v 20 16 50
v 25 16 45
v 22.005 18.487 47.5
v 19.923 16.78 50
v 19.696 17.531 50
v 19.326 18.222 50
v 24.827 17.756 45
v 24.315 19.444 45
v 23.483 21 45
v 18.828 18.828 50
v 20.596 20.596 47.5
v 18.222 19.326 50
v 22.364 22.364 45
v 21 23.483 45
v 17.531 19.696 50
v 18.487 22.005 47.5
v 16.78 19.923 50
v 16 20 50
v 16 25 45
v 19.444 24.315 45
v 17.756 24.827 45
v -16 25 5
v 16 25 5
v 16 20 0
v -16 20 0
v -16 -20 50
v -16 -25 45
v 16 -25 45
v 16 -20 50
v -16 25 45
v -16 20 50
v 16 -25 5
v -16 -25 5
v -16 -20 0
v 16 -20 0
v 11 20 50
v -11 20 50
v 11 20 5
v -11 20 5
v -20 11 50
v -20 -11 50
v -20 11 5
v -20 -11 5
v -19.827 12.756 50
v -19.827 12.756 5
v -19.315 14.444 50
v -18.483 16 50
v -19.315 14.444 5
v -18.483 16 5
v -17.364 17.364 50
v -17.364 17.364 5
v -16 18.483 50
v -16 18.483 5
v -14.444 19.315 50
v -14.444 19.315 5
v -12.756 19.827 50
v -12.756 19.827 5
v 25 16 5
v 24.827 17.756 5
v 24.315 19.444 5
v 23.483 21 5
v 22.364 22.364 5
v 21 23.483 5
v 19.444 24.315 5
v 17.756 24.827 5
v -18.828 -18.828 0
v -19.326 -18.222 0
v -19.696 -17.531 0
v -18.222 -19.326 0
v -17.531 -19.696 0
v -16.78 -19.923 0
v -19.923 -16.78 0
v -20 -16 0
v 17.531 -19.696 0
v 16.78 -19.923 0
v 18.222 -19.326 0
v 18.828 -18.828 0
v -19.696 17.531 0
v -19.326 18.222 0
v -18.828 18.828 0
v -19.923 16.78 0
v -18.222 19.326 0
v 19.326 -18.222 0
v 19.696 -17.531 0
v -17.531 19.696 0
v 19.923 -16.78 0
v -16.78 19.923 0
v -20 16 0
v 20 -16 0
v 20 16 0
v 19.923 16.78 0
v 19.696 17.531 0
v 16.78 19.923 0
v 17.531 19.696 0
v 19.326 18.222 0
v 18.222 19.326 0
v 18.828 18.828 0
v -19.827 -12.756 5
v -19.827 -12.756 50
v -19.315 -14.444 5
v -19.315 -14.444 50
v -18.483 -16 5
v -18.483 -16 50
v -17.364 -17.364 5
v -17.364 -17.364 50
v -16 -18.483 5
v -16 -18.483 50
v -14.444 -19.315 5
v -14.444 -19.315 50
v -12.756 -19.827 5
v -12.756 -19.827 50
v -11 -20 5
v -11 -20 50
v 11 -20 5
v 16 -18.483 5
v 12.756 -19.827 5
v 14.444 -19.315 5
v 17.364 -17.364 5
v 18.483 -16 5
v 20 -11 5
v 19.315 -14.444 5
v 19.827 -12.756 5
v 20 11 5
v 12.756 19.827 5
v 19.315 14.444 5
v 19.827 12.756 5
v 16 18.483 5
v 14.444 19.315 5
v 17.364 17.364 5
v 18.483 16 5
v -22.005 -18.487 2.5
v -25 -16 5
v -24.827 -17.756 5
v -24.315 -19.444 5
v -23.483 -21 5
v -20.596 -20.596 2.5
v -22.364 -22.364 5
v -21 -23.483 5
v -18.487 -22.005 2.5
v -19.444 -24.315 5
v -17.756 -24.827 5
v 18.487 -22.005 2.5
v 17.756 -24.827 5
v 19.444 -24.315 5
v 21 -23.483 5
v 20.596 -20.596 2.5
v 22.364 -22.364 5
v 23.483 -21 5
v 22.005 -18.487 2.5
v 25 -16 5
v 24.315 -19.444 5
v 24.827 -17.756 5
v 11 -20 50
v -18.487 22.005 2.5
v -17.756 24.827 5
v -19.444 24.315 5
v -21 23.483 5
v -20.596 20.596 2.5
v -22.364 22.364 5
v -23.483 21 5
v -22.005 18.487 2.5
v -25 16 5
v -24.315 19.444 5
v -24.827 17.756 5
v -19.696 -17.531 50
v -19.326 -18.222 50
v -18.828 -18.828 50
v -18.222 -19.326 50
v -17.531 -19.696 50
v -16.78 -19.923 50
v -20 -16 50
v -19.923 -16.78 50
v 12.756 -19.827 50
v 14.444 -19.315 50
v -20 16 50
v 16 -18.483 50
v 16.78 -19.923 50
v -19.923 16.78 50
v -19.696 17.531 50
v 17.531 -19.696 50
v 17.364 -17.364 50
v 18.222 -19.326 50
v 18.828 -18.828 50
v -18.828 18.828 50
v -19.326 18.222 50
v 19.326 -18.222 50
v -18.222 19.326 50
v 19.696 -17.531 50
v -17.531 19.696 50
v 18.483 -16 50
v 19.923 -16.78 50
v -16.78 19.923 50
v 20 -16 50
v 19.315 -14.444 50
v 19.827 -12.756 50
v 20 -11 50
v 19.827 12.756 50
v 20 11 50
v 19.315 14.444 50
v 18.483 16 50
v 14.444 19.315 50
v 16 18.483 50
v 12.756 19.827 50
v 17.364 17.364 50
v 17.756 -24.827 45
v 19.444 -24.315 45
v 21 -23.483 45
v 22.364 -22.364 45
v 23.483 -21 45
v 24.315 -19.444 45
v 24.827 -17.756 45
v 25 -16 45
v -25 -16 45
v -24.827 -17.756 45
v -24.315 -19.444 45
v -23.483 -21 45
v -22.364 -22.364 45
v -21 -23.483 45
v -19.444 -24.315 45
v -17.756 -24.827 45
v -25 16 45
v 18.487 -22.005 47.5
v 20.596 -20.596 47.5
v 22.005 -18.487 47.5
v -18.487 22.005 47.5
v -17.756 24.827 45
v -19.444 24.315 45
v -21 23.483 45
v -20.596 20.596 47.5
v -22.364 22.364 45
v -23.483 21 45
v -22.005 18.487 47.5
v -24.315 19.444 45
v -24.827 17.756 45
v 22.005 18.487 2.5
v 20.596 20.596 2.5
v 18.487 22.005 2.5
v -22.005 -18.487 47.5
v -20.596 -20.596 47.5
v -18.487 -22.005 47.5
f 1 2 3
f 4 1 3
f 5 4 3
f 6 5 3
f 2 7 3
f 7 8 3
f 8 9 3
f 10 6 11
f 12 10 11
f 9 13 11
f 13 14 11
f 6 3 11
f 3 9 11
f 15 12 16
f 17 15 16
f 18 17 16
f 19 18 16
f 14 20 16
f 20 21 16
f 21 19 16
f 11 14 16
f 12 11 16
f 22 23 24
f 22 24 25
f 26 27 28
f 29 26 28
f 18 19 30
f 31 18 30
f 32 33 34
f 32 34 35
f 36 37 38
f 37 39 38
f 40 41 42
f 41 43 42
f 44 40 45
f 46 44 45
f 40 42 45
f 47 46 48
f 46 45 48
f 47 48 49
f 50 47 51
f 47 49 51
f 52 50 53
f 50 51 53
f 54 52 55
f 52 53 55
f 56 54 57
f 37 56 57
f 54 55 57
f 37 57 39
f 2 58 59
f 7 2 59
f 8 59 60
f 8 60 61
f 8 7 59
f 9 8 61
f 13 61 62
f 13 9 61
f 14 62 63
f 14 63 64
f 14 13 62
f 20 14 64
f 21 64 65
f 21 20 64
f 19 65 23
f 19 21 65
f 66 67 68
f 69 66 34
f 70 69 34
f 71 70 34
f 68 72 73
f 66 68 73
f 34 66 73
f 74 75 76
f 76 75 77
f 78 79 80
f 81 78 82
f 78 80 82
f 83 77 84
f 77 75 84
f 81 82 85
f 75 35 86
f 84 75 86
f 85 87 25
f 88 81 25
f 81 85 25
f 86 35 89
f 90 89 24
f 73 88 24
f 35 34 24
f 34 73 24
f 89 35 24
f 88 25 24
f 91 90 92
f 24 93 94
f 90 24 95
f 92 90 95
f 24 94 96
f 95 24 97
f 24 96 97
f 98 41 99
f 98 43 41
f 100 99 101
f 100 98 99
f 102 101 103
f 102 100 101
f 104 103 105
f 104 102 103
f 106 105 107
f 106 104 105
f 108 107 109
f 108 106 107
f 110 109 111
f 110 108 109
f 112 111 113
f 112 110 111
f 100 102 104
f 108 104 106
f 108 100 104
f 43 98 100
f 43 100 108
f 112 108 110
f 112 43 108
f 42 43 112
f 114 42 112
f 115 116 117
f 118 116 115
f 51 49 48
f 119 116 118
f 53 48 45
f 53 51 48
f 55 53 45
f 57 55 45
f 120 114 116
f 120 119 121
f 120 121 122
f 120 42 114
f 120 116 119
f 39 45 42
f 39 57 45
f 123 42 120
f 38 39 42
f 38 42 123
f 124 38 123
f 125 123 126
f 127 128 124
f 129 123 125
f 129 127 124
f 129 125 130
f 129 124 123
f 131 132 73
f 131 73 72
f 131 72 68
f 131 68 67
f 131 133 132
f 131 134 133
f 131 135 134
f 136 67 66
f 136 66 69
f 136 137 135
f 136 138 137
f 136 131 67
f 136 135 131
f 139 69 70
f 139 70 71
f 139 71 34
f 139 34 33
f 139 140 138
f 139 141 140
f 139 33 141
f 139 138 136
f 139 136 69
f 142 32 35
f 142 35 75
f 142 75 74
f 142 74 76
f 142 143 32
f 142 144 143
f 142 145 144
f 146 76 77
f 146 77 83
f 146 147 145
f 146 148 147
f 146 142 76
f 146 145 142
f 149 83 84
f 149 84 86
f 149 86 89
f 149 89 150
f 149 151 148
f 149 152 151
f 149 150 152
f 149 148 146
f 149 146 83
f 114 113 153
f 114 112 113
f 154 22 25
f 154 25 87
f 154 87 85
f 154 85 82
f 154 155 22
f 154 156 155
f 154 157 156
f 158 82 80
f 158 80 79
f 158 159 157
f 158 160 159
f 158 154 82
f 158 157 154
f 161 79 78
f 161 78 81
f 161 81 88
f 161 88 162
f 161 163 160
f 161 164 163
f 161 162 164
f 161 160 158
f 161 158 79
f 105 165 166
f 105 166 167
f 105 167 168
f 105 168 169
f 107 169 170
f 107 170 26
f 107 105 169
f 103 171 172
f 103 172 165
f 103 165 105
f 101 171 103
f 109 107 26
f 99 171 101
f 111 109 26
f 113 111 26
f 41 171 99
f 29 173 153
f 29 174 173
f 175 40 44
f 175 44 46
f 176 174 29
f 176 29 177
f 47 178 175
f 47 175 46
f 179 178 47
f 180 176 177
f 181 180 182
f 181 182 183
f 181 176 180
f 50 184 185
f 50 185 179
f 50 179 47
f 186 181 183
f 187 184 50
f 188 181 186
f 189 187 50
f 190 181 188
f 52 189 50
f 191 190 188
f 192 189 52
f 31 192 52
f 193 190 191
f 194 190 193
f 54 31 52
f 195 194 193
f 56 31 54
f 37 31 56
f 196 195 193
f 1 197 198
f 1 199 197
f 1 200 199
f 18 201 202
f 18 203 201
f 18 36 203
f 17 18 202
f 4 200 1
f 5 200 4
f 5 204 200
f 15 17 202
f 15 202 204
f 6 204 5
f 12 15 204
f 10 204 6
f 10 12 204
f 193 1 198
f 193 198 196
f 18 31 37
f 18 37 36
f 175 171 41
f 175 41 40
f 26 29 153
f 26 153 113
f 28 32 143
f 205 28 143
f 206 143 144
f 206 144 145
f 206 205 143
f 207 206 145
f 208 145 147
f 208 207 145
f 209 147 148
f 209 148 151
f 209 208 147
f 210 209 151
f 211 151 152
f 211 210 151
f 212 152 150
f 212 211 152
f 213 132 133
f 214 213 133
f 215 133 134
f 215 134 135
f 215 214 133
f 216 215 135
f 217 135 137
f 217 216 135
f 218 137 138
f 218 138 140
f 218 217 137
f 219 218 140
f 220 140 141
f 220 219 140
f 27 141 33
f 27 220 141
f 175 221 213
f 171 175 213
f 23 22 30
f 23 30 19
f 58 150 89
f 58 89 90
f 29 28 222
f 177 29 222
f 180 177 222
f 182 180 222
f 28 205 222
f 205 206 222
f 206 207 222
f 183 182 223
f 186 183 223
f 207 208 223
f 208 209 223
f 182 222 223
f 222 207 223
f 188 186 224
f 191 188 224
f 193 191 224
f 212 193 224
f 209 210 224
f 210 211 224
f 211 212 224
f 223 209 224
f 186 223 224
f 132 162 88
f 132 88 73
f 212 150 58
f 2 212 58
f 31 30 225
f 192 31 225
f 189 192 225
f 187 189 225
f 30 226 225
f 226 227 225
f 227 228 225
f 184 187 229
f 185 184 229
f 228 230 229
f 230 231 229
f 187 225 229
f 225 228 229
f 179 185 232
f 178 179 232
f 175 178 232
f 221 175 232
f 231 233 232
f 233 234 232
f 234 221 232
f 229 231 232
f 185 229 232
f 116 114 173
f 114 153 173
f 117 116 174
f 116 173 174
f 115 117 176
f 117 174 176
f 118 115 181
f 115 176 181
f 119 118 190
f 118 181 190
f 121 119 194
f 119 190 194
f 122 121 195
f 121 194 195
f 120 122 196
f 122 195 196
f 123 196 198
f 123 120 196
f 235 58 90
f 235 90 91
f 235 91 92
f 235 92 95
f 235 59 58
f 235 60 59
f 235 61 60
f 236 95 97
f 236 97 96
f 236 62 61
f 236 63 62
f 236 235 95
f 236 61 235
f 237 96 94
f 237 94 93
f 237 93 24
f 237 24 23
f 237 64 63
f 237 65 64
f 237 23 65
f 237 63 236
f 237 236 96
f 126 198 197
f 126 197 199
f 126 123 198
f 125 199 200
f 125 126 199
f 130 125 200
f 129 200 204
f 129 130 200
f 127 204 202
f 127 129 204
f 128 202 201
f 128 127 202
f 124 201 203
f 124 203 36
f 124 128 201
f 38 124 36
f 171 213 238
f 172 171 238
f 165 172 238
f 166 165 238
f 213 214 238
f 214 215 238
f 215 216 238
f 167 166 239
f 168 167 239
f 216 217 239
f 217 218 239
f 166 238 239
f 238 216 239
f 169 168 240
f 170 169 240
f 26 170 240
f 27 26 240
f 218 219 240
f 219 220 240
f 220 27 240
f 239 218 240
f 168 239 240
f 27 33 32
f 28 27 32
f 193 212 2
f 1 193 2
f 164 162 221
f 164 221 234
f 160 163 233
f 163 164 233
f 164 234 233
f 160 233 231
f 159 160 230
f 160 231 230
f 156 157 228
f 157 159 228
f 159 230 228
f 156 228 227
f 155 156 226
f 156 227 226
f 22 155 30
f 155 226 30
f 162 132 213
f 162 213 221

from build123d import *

# Parameters (mm, degrees)
F0_W     = 50
F0_H     = 50
F1_DEPTH = 50
F2_T     = -5
F3_R     = 9
F4_SIZE  = 4.99999


# Not quite as in the source:
# - a fillet or chamfer is up to 0.001 mm smaller than in the source, because OpenCascade refuses the exact size


with BuildPart() as f1:
    # F0 (on Top) → F1 (new body)
    with BuildSketch(Plane.XY):
        Rectangle(F0_W, F0_H)
    extrude(amount=F1_DEPTH)

    # F2
    f2_openings = [f1.faces().sort_by_distance(p)[0] for p in [
        (0, 0, 50),
    ]]
    offset(amount=F2_T, openings=f2_openings)

    # F3
    f3_edges = [f1.edges().sort_by_distance(p)[0] for p in [
        (-25, 25, 25),
        (-25, -25, 25),
        (25, -25, 25),
        (25, 25, 25),
        (20, -20, 27.5),
        (-20, -20, 27.5),
        (-20, 20, 27.5),
        (20, 20, 27.5),
    ]]
    fillet(f3_edges, radius=F3_R)

    # F4 (size 5 in the source; OpenCascade refuses exactly that, so slightly less here)
    f4_edges = [f1.edges().sort_by_distance(p)[0] for p in [
        (25, 0, 0),
        (25, -16, 25),
        (25, 16, 25),
        (25, 0, 50),
        (0, 25, 0),
        (16, 25, 25),
        (-16, 25, 25),
        (0, 25, 50),
        (-25, 0, 0),
        (-25, 16, 25),
        (-25, -16, 25),
        (-25, 0, 50),
        (0, -25, 0),
        (-16, -25, 25),
        (16, -25, 25),
        (0, -25, 50),
    ]]
    chamfer(f4_edges, length=F4_SIZE)


solid = f1.part
